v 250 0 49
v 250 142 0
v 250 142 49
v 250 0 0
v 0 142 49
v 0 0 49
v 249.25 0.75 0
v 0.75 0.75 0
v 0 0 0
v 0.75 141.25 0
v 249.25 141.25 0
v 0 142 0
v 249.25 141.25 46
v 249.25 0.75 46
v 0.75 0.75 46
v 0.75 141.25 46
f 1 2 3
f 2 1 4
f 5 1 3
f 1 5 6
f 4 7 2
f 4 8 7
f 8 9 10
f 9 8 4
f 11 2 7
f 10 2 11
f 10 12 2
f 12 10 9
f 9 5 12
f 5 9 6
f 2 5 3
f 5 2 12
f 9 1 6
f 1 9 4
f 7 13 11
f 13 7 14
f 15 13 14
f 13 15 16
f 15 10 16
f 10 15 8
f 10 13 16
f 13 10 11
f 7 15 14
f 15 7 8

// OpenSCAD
/*Code Generated using OSCADSharp on 08/08/2026 15:51:44. 

For more information, please visit https://github.com/Exolun/OSCADSharp */

module render()
{
    difference()
    {
        cube(size = [250.00, 142.00, 49.00], center = false); 
        translate(v = [0.75, 0.75, 0.00])
        {
            cube(size = [248.50, 140.50, 46.00], center = false); 
        }
    }
}

render();
